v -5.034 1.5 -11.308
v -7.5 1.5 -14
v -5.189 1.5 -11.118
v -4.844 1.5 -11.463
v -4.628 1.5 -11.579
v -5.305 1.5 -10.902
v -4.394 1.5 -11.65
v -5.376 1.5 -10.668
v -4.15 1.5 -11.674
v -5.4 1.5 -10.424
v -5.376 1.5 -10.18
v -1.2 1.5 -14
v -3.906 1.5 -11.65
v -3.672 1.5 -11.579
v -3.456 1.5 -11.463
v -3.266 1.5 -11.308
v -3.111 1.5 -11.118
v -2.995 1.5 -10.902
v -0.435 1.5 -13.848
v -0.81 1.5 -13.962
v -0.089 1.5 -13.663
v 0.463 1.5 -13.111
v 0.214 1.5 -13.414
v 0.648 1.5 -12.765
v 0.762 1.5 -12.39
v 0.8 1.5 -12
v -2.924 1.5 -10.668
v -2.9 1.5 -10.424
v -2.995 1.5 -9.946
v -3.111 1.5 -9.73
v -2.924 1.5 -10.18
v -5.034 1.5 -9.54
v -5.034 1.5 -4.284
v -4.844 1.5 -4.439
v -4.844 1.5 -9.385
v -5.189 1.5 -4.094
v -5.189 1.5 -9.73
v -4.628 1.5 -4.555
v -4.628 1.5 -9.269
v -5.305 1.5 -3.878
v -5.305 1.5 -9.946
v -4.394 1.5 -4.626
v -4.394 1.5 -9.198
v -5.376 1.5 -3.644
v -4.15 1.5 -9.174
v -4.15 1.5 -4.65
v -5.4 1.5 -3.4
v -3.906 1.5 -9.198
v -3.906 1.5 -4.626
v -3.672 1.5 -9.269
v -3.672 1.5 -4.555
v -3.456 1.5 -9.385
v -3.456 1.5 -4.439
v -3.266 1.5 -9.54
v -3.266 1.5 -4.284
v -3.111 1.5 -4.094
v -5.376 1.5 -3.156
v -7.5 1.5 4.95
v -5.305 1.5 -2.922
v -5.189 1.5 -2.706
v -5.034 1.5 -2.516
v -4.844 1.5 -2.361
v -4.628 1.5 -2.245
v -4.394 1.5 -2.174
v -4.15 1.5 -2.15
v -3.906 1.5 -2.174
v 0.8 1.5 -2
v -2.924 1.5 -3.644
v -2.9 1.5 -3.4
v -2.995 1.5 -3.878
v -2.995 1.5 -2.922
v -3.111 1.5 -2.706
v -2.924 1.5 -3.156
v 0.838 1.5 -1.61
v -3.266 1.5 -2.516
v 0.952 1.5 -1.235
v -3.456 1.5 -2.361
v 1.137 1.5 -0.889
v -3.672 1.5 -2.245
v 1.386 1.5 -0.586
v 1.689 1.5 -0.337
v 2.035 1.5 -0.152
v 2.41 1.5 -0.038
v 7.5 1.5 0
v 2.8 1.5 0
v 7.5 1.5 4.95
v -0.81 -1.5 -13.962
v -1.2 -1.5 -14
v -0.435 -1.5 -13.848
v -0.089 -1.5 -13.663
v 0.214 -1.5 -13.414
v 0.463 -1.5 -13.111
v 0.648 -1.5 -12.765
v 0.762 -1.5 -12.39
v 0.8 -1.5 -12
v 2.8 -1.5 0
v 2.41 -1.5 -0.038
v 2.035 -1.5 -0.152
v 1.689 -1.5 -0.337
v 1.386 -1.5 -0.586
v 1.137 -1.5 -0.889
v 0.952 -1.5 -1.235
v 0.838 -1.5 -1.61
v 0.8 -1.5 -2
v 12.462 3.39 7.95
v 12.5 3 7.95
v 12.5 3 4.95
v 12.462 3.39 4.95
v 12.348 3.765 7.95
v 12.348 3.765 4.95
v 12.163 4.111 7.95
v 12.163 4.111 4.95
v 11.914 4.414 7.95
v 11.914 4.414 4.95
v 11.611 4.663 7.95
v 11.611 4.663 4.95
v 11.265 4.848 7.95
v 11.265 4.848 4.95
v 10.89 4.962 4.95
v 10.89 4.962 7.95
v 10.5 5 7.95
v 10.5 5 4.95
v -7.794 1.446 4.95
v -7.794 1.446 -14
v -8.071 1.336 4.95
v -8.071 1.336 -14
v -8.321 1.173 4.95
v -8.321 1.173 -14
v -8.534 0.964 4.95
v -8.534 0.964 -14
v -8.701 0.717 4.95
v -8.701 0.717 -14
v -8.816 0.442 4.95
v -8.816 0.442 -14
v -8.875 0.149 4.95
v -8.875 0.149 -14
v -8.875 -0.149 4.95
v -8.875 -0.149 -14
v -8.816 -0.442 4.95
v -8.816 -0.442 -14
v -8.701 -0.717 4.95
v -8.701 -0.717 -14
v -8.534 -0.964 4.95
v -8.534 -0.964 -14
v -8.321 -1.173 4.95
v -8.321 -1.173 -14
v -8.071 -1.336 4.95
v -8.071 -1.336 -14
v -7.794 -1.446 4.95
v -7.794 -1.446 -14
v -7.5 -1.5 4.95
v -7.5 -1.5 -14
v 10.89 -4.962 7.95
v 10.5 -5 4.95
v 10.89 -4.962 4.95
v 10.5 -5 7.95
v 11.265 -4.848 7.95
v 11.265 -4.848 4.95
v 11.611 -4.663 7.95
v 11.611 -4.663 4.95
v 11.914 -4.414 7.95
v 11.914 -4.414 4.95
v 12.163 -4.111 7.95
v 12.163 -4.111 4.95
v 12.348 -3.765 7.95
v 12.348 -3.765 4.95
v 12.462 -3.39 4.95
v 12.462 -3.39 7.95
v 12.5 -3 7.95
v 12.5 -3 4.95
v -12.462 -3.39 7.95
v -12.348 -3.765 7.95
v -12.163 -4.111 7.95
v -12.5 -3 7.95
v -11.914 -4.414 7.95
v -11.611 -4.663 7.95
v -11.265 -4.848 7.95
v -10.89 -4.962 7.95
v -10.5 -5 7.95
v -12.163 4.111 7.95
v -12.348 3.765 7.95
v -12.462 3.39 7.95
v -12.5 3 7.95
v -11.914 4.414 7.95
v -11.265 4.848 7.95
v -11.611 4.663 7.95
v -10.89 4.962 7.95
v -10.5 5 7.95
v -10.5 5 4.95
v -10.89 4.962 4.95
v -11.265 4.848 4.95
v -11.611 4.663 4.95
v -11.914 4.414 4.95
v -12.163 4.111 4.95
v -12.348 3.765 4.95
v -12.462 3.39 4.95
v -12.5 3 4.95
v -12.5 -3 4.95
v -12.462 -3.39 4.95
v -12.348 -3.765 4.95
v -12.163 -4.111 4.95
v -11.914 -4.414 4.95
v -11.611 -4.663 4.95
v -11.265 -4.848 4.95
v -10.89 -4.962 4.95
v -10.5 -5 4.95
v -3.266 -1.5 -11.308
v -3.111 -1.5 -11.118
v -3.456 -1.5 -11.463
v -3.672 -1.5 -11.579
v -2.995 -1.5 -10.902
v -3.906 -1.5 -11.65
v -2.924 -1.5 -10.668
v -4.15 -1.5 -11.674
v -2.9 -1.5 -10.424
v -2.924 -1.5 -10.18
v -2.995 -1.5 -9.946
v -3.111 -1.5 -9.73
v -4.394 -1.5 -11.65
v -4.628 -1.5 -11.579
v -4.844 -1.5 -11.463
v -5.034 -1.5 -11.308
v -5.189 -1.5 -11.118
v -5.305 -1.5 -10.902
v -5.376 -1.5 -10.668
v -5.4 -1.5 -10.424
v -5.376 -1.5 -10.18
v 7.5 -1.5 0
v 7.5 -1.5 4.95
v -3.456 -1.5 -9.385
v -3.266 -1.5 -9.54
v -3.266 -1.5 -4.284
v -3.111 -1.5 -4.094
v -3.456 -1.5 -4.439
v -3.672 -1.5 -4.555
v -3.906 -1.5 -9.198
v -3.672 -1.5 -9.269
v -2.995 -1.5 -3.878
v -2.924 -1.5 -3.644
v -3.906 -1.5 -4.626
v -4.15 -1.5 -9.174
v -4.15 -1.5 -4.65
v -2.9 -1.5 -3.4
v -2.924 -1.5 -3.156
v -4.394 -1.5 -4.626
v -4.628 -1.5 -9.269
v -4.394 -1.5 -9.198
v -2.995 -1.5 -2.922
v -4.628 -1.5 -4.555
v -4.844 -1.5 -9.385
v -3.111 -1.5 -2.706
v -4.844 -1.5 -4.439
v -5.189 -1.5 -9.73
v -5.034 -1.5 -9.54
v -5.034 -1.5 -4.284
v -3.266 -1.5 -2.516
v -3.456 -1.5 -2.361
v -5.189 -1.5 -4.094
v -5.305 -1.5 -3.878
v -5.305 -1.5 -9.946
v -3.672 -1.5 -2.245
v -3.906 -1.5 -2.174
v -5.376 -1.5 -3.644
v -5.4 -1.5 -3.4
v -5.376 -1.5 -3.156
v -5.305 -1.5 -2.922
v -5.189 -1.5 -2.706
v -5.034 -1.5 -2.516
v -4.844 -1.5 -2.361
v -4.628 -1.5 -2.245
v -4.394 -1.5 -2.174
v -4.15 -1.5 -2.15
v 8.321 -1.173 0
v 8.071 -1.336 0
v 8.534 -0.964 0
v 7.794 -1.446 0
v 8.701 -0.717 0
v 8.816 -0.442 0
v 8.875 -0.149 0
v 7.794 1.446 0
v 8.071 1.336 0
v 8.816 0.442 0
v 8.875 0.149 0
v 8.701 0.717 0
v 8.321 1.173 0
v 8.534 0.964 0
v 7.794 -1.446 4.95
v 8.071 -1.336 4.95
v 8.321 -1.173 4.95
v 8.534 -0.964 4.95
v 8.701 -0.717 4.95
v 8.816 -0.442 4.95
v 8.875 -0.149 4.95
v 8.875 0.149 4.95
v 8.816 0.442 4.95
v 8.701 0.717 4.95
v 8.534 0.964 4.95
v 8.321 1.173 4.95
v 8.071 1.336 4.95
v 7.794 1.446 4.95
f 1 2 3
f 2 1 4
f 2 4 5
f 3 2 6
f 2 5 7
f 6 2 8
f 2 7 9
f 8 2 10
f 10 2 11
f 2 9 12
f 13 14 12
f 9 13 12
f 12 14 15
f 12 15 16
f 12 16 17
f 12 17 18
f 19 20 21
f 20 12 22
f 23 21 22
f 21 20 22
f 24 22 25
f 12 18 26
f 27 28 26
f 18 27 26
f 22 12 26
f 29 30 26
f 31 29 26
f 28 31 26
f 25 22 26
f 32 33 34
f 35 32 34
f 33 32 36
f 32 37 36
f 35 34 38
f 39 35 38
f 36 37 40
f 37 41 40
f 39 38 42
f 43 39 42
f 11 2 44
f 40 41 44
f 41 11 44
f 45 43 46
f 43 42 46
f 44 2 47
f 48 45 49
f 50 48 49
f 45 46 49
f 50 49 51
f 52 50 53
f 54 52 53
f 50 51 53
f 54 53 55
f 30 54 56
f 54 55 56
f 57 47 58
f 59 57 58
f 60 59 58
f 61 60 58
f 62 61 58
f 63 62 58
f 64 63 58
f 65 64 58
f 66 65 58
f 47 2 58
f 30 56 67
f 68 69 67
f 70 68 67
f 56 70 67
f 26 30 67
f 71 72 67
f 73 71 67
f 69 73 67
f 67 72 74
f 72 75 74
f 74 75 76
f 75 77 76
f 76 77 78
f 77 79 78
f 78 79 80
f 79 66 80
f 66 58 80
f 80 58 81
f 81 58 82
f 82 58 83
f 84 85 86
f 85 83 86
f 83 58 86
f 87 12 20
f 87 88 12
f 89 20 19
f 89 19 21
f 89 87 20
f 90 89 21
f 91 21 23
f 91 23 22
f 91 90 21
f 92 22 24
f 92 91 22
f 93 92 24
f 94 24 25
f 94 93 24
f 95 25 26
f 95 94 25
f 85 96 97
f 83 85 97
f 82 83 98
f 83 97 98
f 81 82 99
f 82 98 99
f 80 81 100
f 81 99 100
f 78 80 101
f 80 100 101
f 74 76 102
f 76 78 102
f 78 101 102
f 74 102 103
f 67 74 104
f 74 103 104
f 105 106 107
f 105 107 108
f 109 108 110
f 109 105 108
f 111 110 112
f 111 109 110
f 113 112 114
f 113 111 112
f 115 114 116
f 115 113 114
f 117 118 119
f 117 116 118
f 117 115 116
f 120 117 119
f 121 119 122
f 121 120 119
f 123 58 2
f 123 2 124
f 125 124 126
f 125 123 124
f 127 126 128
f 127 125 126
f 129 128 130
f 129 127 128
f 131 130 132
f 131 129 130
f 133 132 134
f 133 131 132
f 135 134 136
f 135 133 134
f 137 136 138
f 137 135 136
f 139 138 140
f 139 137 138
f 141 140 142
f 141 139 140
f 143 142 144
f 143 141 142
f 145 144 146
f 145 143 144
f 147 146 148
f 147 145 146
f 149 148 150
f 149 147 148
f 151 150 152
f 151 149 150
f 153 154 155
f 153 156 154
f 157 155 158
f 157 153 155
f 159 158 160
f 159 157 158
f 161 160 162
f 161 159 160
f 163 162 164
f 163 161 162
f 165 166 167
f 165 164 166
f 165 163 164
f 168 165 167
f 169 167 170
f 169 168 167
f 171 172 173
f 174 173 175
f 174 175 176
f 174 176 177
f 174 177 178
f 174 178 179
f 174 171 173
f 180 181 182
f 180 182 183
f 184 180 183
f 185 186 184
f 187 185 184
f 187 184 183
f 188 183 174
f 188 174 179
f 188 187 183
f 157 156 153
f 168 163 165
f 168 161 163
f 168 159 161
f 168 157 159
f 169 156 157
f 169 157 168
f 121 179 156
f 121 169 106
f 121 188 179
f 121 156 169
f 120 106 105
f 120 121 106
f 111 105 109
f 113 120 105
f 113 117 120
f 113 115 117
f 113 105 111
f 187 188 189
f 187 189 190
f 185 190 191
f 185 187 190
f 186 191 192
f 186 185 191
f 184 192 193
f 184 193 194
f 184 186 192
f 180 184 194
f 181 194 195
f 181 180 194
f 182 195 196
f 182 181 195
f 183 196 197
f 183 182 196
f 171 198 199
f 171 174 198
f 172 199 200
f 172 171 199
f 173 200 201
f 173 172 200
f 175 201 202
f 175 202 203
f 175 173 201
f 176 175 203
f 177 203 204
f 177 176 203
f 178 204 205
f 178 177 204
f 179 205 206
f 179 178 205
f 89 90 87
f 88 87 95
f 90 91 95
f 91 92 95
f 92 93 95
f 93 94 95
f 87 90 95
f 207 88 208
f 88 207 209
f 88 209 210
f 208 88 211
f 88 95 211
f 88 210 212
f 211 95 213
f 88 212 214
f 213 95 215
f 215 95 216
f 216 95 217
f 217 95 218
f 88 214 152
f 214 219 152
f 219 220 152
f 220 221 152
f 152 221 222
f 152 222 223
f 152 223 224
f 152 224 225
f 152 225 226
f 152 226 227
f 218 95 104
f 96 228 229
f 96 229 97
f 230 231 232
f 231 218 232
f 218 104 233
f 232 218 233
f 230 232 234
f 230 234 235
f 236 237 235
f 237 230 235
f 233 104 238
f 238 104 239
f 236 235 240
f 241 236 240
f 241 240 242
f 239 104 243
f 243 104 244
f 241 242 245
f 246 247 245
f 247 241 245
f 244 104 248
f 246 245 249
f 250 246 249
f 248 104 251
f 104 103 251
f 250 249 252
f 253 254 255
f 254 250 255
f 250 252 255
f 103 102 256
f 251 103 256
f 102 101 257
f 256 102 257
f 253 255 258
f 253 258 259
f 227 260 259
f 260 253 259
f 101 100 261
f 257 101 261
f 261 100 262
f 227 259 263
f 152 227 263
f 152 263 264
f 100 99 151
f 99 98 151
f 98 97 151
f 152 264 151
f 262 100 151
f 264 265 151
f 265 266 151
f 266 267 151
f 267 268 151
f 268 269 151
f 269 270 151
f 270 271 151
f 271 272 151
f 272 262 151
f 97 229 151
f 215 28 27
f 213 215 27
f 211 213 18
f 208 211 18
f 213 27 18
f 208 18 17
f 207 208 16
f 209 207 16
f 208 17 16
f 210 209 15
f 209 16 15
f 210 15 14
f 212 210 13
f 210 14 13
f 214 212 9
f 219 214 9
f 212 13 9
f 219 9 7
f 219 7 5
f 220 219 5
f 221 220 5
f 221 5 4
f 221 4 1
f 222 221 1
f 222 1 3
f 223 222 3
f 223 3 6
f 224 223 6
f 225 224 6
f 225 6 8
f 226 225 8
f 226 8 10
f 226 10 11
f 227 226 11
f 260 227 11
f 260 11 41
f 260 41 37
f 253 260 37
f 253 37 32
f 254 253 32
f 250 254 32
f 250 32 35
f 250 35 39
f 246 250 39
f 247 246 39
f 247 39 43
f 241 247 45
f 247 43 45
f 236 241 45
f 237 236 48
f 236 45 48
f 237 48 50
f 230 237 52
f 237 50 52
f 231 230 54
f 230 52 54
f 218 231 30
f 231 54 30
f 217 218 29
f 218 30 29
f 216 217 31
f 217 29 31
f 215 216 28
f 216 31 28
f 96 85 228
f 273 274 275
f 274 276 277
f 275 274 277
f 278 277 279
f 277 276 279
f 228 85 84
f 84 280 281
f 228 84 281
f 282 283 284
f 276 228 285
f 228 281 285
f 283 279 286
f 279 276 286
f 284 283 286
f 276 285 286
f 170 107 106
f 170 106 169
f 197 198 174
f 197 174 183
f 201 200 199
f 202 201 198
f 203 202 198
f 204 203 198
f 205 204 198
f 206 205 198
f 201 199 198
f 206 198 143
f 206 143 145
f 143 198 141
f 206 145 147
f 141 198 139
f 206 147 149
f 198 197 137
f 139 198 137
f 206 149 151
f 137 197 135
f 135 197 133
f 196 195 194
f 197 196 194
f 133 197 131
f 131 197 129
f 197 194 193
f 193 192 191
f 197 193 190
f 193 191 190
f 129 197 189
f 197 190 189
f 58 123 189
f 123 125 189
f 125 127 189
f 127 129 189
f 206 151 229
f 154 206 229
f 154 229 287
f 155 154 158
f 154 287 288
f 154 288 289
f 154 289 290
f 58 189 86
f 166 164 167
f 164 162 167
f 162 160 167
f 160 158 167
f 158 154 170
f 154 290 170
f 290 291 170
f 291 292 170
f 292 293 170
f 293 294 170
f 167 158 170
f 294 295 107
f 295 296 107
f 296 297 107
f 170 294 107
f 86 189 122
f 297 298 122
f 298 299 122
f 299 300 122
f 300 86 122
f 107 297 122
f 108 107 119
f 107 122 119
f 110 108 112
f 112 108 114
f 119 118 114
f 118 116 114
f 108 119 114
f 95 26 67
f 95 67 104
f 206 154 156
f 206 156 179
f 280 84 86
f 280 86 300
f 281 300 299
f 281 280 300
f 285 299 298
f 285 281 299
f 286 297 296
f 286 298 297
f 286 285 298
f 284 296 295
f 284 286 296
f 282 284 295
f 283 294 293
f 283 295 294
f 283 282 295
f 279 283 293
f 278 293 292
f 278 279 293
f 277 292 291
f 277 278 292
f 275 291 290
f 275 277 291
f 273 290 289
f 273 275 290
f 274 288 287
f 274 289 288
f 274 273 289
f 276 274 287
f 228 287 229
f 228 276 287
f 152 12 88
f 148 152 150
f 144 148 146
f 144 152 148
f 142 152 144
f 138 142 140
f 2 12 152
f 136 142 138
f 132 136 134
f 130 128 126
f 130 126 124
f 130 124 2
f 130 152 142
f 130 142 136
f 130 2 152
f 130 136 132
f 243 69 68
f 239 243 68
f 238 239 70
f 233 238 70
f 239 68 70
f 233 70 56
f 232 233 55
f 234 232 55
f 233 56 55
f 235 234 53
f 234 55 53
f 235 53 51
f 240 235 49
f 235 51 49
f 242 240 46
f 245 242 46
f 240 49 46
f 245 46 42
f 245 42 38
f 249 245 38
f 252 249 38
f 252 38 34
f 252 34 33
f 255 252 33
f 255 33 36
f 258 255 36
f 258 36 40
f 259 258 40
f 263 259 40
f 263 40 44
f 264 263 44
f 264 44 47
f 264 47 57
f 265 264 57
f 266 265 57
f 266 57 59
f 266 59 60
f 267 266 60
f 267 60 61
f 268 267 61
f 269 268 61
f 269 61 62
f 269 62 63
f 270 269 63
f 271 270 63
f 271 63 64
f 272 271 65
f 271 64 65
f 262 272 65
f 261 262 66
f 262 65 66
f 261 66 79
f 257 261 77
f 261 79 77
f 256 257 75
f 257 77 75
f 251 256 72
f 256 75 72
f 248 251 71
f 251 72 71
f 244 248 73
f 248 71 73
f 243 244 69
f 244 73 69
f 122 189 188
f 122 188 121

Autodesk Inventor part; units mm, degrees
ref_plane "YZ Plane" through (0, 0, 0) normal (1, 0, 0) x (0, 1, 0)
ref_plane "XZ Plane" through (0, 0, 0) normal (0, 1, 0) x (-1, 0, 0)
ref_plane "XY Plane" through (0, 0, 0) normal (0, 0, 1) x (1, 0, 0)
sketch "Sketch1" plane through (0, 0, 0) normal (0, 0, 1) x (1, 0, 0)
  line L0 (7.5, -1.5) -> (-7.5, -1.5)
  arc A0 (7.5, -1.5) -> (7.5, 1.5) centre (7.3777, 0) ccw
  line L1 (0, -2.1) -> (0, 2.1) construction
  arc A1 (-7.5, 1.5) -> (-7.5, -1.5) centre (-7.3777, 0) ccw
  line L2 (-12.4357, 0) -> (12.4357, 0) construction
  line L3 (7.5, 1.5) -> (-7.5, 1.5)
  point P0 (0, 0)
  point P1 (0, 1.5)
  dimension "d0" = 15
  dimension "d1" = 3
extrude "Extrusion1" add sketch "Sketch1" along normal blind 4.95
sketch "Sketch2" plane through (0, 0, 4.95) normal (0, 0, 1) x (1, 0, 0)
  line L0 (-12.5, 5) -> (12.5, 5)
  line L1 (12.5, 5) -> (12.5, -5)
  line L2 (12.5, -5) -> (-12.5, -5)
  line L3 (-12.5, -5) -> (-12.5, 5)
  point P0 (0, 0)
  point P1 (0, 5)
  point P2 (12.5, 0)
  dimension "d4" = 25
  dimension "d5" = 10
extrude "Extrusion2" add sketch "Sketch2" along normal blind 3
sketch "Sketch3" plane through (0, 0, 0) normal (0, 0, -1) x (-1, 0, 0)
  line L0 (-0.8, 1.5) -> (-0.8, -1.5)
  line L1 (-0.8, -1.5) -> (7.5, -1.5)
  arc A0 (7.5, -1.5) -> (7.5, 1.5) centre (7.3777, 0) ccw projected
  line L2 (7.5, 1.5) -> (-0.8, 1.5)
  line L3 (7.5, 1.5) -> (-7.5, 1.5) projected
  point P0 (0, 0)
extrude "Extrusion3" add sketch "Sketch3" along normal blind 14
sketch "Sketch5" plane through (-7.5, 1.5, 4.95) normal (0, 1, 0) x (1, 0, 0)
  circle A0 centre (3.35, 8.35) radius 1.25
  circle A1 centre (3.35, 15.374) radius 1.25
  line L0 (-5, 0) -> (-5, -3) projected
  line L1 (-5, 0) -> (20, 0) projected
  point P0 (7.5, 4.95)
  dimension "d18" = 2.5
  dimension "d19" = 8.35
  dimension "d20" = 8.35
  dimension "d21" = 7.024
extrude "Extrusion5" cut sketch "Sketch5" against normal through all
fillet "Fillet1" radius 2 6 edges at (0.8, 0, 0) (0.8, 0, -14) (-12.5, 5, 6.45) (-12.5, -5, 6.45) (12.5, -5, 6.45) (12.5, 5, 6.45)
properties part number "StartSupport"
